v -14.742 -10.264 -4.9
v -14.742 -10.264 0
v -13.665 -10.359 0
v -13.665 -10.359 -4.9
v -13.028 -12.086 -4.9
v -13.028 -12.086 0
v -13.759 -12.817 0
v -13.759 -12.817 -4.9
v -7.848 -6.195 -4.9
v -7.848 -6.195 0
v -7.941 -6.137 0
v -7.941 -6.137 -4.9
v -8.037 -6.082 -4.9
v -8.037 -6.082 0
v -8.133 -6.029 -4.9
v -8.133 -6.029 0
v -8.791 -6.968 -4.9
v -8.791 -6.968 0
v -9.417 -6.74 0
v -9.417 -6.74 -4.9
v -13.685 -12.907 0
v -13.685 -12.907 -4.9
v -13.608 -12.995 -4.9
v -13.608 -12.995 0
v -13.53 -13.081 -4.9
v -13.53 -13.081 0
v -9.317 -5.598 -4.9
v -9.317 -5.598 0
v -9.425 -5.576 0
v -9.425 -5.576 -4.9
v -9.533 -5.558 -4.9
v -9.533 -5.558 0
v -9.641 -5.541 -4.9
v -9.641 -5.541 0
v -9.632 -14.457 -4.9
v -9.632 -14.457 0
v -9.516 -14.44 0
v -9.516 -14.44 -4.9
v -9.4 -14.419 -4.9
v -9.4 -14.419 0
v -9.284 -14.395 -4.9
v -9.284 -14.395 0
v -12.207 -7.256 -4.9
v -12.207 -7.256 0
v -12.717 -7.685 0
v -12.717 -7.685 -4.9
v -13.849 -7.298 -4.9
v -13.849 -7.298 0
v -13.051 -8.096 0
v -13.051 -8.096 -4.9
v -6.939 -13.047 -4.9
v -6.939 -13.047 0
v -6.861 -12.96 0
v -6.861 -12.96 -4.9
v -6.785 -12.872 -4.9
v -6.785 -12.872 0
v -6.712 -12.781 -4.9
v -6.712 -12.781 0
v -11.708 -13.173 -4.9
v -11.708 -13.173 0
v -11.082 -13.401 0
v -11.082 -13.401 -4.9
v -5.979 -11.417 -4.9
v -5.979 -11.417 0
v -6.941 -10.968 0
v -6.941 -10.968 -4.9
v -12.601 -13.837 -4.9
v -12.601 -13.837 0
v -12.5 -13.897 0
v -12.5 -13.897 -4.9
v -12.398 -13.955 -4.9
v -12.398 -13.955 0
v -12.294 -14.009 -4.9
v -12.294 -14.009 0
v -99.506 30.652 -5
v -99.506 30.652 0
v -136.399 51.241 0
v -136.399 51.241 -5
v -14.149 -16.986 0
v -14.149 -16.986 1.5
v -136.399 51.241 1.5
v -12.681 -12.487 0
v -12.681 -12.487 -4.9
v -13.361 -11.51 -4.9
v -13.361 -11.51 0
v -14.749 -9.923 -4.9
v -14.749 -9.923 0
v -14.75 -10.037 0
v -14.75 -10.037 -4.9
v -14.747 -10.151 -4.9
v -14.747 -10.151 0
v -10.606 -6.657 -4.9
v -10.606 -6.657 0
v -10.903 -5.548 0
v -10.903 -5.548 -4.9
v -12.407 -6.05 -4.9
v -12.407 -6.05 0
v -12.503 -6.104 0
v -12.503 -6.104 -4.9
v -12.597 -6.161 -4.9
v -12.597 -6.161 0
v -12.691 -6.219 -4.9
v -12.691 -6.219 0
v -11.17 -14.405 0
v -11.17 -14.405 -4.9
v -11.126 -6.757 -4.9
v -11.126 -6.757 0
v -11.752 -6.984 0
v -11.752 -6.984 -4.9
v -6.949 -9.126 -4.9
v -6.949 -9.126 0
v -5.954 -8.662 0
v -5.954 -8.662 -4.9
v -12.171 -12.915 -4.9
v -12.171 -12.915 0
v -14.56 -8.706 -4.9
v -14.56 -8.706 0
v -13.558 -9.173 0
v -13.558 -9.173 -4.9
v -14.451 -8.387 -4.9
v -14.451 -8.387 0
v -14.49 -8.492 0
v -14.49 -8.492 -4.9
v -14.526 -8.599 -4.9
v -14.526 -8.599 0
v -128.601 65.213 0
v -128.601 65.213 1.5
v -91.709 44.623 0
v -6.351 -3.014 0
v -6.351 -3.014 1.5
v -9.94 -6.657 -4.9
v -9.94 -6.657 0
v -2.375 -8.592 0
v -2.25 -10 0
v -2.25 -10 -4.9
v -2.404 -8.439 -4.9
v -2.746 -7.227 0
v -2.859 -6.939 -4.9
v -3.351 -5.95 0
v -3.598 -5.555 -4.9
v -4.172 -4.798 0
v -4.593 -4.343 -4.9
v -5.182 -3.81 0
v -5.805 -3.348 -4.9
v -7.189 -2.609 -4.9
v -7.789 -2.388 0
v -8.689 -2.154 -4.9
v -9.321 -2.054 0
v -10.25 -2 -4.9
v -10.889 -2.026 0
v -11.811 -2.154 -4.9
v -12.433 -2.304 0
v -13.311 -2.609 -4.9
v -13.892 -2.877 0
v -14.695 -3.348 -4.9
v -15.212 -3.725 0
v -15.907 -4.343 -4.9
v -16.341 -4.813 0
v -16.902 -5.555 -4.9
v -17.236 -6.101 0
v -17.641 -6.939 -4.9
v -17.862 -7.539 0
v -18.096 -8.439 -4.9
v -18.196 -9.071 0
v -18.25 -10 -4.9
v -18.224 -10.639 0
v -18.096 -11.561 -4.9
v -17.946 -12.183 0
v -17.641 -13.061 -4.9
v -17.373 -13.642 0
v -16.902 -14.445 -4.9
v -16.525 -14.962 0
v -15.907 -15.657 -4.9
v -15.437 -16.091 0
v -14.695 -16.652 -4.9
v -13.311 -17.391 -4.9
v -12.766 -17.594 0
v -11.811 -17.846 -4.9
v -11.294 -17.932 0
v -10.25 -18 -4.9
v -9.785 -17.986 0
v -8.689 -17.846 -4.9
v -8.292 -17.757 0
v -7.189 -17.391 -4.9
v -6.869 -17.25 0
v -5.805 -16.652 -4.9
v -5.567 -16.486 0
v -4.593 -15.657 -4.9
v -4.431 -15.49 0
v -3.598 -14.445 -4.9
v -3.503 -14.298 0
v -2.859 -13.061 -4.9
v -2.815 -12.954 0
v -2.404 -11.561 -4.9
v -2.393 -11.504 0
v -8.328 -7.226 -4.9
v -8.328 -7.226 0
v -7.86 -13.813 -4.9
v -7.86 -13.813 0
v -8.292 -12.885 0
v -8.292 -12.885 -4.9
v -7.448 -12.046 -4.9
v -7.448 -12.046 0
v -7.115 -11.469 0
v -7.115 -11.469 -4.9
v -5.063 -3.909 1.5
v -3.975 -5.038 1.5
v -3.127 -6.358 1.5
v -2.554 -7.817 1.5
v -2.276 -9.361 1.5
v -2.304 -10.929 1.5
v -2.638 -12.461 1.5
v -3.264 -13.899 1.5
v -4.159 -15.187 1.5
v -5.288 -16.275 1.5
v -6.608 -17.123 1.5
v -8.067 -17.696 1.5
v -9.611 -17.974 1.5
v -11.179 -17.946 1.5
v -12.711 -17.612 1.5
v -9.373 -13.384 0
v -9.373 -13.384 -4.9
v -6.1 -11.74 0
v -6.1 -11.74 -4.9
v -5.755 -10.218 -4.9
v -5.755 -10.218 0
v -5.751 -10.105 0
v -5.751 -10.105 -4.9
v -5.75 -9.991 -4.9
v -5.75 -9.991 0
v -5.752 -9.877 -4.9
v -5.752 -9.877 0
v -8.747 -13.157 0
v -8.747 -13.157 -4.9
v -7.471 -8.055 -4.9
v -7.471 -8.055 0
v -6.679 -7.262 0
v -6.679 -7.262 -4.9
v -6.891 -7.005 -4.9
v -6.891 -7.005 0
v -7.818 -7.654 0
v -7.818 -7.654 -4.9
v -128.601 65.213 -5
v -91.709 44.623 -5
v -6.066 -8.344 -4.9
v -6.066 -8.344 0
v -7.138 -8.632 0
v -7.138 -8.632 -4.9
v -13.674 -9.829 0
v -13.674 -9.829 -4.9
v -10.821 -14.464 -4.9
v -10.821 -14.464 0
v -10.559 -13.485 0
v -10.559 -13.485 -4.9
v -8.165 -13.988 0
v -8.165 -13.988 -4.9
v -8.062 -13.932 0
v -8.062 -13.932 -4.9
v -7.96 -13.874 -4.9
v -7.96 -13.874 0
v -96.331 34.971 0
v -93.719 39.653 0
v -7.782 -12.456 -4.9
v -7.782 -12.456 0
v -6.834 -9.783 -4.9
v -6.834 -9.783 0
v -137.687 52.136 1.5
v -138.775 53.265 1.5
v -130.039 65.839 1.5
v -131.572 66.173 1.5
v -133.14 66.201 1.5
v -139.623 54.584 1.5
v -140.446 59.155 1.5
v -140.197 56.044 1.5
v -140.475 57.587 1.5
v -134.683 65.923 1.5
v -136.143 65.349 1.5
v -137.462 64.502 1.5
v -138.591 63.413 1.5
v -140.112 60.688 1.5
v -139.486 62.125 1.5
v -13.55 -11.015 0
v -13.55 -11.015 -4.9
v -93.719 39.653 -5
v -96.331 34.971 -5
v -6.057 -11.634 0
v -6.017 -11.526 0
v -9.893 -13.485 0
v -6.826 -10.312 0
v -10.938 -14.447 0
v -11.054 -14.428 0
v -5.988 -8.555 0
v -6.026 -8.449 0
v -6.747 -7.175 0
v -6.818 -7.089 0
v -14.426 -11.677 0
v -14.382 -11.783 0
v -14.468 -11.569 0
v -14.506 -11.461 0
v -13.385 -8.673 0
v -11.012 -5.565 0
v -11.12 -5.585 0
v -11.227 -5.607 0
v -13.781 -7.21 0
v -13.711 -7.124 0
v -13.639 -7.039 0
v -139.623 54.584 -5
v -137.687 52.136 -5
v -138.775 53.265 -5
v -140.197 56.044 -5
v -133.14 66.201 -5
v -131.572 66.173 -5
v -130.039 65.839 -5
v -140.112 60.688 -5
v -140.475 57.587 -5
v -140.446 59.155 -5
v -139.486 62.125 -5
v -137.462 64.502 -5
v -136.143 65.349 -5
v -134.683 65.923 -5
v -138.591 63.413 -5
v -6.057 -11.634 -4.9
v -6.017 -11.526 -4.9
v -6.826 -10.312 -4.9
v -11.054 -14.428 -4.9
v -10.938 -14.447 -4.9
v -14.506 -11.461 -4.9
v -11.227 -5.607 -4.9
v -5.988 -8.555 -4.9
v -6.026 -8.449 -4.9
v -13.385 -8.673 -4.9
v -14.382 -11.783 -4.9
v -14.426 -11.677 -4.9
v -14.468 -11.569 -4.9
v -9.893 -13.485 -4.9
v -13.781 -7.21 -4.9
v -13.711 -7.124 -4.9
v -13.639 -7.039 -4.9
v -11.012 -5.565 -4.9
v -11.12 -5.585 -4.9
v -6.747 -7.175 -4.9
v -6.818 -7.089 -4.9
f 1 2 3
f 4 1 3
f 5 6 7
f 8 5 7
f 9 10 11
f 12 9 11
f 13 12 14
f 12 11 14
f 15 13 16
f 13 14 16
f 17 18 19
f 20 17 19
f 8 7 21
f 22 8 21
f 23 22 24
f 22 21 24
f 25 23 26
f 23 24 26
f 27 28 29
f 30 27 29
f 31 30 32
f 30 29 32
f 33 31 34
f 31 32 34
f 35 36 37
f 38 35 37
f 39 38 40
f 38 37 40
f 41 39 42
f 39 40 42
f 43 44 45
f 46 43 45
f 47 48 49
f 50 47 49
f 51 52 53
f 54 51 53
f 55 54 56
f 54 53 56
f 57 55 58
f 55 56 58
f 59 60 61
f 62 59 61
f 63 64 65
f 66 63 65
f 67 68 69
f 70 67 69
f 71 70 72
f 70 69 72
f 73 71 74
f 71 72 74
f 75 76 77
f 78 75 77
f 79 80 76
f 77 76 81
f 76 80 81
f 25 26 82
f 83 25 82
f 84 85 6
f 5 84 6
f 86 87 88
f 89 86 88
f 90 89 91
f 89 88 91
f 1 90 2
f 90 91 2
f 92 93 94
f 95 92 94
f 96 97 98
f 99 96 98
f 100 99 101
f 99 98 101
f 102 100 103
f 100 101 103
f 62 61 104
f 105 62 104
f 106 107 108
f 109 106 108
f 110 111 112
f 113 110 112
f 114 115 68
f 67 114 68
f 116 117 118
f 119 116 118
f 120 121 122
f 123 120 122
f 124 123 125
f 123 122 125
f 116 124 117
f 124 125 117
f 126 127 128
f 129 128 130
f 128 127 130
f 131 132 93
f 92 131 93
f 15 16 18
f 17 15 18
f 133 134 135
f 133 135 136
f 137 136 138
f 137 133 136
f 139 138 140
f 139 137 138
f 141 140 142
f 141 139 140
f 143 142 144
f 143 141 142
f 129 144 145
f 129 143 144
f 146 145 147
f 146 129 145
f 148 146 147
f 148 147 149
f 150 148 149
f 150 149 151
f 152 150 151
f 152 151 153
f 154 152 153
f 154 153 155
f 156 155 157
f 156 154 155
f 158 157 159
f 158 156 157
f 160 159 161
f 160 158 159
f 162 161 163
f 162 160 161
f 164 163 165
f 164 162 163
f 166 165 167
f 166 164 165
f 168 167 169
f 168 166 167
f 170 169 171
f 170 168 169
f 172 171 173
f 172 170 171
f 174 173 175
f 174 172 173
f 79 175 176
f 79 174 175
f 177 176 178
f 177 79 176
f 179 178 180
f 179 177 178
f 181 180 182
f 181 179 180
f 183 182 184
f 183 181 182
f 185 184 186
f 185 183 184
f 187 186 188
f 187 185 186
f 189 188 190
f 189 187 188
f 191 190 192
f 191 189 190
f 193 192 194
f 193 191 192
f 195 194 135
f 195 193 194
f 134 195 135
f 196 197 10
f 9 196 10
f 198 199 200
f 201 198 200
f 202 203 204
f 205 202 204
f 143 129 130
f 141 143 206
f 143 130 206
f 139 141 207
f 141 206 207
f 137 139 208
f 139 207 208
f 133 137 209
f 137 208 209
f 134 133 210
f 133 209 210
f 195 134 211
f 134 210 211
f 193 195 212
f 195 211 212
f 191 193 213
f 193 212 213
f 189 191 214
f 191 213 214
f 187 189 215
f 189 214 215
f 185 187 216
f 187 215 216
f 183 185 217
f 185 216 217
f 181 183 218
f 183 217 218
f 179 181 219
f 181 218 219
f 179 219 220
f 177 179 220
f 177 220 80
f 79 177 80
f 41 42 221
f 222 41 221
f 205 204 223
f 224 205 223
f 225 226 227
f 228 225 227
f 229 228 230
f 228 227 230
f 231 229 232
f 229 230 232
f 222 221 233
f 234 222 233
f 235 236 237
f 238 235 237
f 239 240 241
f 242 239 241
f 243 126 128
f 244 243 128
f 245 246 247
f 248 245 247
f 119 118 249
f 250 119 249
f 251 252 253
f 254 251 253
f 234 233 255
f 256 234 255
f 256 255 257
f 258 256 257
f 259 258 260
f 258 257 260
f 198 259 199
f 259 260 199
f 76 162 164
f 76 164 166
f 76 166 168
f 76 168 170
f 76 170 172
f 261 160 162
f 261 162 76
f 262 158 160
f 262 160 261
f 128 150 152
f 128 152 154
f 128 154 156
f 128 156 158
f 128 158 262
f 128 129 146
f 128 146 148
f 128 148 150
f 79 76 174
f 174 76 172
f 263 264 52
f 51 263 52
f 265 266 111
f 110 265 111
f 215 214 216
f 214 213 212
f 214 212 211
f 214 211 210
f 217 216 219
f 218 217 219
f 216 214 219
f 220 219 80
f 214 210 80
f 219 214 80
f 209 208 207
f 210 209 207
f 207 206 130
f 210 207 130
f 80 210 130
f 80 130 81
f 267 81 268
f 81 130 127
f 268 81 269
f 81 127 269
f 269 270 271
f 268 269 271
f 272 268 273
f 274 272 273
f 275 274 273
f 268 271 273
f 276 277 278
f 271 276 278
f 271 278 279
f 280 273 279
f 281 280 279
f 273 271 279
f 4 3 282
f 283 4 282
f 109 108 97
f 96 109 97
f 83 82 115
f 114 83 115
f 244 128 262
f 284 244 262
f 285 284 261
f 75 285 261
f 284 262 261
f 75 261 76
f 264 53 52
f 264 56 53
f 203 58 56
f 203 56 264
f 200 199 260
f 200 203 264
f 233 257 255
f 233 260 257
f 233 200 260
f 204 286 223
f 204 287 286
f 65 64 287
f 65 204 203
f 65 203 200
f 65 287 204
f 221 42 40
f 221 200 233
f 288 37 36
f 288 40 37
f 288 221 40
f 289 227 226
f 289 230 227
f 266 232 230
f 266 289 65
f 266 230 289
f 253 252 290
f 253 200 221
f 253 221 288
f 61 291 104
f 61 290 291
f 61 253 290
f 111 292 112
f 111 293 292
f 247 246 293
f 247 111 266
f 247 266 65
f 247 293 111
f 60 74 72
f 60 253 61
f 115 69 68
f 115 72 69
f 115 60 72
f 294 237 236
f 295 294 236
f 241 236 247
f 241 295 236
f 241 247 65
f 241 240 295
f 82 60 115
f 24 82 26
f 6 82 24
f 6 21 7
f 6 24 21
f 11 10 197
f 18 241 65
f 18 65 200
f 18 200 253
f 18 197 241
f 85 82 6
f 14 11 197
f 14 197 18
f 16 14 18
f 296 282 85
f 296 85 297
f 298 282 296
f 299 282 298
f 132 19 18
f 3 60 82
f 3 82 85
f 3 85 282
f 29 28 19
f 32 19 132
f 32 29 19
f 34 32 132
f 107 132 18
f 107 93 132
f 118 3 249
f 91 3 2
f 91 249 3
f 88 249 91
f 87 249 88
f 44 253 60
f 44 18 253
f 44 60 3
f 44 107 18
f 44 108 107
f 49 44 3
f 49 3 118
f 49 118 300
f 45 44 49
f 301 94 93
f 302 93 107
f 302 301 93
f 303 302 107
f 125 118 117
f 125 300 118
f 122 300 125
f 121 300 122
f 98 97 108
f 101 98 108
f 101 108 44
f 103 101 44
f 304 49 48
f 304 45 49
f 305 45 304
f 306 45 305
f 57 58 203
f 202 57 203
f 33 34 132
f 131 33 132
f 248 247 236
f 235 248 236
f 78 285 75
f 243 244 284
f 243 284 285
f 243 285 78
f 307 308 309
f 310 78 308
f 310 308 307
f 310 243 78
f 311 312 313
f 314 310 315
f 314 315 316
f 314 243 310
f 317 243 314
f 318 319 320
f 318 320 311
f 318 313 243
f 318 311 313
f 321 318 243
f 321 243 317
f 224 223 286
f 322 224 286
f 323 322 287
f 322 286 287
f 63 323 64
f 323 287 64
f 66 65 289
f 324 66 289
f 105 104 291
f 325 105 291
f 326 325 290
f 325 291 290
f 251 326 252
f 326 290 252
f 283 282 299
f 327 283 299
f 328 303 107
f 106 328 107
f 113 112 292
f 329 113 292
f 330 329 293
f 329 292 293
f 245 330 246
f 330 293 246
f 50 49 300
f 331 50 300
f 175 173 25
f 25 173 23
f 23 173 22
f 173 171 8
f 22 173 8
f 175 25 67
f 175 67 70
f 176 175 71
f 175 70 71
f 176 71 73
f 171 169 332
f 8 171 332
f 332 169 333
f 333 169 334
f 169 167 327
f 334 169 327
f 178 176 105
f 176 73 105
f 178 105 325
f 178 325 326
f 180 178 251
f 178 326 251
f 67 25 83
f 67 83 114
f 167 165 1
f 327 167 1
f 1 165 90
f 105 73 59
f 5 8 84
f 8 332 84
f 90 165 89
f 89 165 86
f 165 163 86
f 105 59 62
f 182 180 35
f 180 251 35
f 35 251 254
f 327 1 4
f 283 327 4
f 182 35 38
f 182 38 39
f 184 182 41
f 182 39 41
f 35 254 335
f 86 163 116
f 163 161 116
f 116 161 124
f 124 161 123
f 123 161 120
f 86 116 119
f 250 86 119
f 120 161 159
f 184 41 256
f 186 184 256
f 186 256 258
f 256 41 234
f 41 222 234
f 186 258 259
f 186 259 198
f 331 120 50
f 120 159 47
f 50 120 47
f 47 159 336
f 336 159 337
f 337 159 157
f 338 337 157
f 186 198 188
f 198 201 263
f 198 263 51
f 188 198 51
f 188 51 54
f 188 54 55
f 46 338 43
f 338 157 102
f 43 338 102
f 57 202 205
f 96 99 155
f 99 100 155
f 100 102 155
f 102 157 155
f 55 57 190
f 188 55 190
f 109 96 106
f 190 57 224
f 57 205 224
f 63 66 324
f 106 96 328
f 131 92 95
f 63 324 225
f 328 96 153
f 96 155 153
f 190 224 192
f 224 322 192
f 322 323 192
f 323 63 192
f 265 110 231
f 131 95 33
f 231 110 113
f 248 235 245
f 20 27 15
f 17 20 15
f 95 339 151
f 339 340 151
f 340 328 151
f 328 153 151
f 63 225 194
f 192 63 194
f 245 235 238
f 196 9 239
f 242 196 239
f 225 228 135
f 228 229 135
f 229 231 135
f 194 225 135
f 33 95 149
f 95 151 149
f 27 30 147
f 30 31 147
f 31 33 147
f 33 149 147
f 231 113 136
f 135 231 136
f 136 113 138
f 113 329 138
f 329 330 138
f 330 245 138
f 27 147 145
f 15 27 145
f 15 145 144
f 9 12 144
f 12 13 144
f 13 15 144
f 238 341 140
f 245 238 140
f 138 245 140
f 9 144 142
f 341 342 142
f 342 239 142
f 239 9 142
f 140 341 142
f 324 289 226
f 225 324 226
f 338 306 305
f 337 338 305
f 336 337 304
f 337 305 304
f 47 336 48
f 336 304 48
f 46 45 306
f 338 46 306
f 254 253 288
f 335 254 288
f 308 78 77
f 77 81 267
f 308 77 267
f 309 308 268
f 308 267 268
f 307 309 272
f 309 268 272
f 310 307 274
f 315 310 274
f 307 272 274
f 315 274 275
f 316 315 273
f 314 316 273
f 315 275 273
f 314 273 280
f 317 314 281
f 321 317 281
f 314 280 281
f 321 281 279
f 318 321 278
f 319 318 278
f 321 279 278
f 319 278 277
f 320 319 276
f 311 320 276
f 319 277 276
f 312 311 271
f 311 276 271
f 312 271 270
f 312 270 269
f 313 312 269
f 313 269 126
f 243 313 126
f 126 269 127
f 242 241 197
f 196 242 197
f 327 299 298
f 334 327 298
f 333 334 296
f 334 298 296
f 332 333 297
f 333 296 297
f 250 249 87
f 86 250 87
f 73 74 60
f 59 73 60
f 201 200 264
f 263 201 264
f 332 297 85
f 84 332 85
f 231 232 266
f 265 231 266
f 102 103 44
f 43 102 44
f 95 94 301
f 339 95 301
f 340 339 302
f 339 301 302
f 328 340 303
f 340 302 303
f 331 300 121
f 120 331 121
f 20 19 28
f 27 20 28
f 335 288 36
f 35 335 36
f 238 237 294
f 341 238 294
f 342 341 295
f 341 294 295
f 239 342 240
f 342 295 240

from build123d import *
from build123d.topology import SkipClean

# Parameters (mm, degrees)
ESQUISSE1_R        = 8
BOSS_EXTRU_1_DEPTH = 4.9
BOSS_EXTRU_2_START = 1.5
BOSS_EXTRU_2_DEPTH = 1.5
BOSS_EXTRU_3_DEPTH = 5


with BuildPart() as part:
    # Esquisse1 → Boss.-Extru.1 (new body)
    with BuildSketch(Plane.XY):
        with Locations((-10.25, -10)):
            Circle(ESQUISSE1_R)
        with BuildLine():
            Line((-5.751675839, -9.877200395), (-6.833750507, -9.782531128))
            Line((-6.833750507, -9.782531128), (-6.949445107, -9.126394451))
            Line((-6.949445107, -9.126394451), (-5.953521963, -8.661987862))
            ThreePointArc((-5.953521963, -8.661987862), (-6.006634107, -8.502052772), (-6.065697468, -8.344218516))
            Line((-6.065697468, -8.344218516), (-7.138261768, -8.631611254))
            Line((-7.138261768, -8.631611254), (-7.47139109, -8.054614344))
            Line((-7.47139109, -8.054614344), (-6.678798898, -7.262022153))
            ThreePointArc((-6.678798898, -7.262022153), (-6.782621037, -7.131675902), (-6.891198054, -7.005263035))
            Line((-6.891198054, -7.005263035), (-7.818046533, -7.654249327))
            Line((-7.818046533, -7.654249327), (-8.328430264, -7.225986526))
            Line((-8.328430264, -7.225986526), (-7.847635402, -6.194918616))
            ThreePointArc((-7.847635402, -6.194918616), (-7.988951343, -6.109285545), (-8.133315872, -6.028898352))
            Line((-8.133315872, -6.028898352), (-8.791112727, -6.968329619))
            Line((-8.791112727, -6.968329619), (-9.417191057, -6.740455742))
            Line((-9.417191057, -6.740455742), (-9.317216173, -5.597737589))
            ThreePointArc((-9.317216173, -5.597737589), (-9.478728542, -5.566588183), (-9.641271425, -5.541362369))
            Line((-9.641271425, -5.541362369), (-9.940094206, -6.656584169))
            Line((-9.940094206, -6.656584169), (-10.606352849, -6.656584169))
            Line((-10.606352849, -6.656584169), (-10.903477232, -5.547700874))
            ThreePointArc((-10.903477232, -5.547700874), (-11.065761738, -5.574558464), (-11.226956242, -5.607329229))
            Line((-11.226956242, -5.607329229), (-11.126406846, -6.756614081))
            Line((-11.126406846, -6.756614081), (-11.752485176, -6.984487958))
            Line((-11.752485176, -6.984487958), (-12.406540122, -6.050400691))
            ThreePointArc((-12.406540122, -6.050400691), (-12.550096477, -6.132241451), (-12.690551241, -6.219297732))
            Line((-12.690551241, -6.219297732), (-12.206963835, -7.256354271))
            Line((-12.206963835, -7.256354271), (-12.717347566, -7.684617071))
            Line((-12.717347566, -7.684617071), (-13.638885709, -7.039349117))
            ThreePointArc((-13.638885709, -7.039349117), (-13.74618945, -7.166864047), (-13.848697947, -7.298264801))
            Line((-13.848697947, -7.298264801), (-13.051434053, -8.095528695))
            Line((-13.051434053, -8.095528695), (-13.384563375, -8.672525605))
            Line((-13.384563375, -8.672525605), (-14.450903238, -8.3868007))
            ThreePointArc((-14.450903238, -8.3868007), (-14.508366703, -8.545244687), (-14.559856563, -8.705729393))
            Line((-14.559856563, -8.705729393), (-13.557961929, -9.172920534))
            Line((-13.557961929, -9.172920534), (-13.673656528, -9.829057211))
            Line((-13.673656528, -9.829057211), (-14.74934404, -9.923167674))
            ThreePointArc((-14.74934404, -9.923167674), (-14.749021481, -10.093838761), (-14.74222728, -10.264374865))
            Line((-14.74222728, -10.264374865), (-13.665452724, -10.358580432))
            Line((-13.665452724, -10.358580432), (-13.549758125, -11.014717109))
            Line((-13.549758125, -11.014717109), (-14.506309194, -11.460764198))
            ThreePointArc((-14.506309194, -11.460764198), (-14.447094307, -11.623083293), (-14.381691786, -11.78300953))
            Line((-14.381691786, -11.78300953), (-13.360941463, -11.509500306))
            Line((-13.360941463, -11.509500306), (-13.027812142, -12.086497216))
            Line((-13.027812142, -12.086497216), (-13.758807936, -12.817493011))
            ThreePointArc((-13.758807936, -12.817493011), (-13.646852578, -12.951506829), (-13.529782028, -13.081076086))
            Line((-13.529782028, -13.081076086), (-12.681156698, -12.486862233))
            Line((-12.681156698, -12.486862233), (-12.170772967, -12.915125033))
            Line((-12.170772967, -12.915125033), (-12.600738895, -13.837189942))
            ThreePointArc((-12.600738895, -13.837189942), (-12.448909121, -13.926168447), (-12.293716433, -14.009142444))
            Line((-12.293716433, -14.009142444), (-11.708090504, -13.172781941))
            Line((-11.708090504, -13.172781941), (-11.082012174, -13.400655818))
            Line((-11.082012174, -13.400655818), (-11.169878896, -14.404977051))
            ThreePointArc((-11.169878896, -14.404977051), (-10.996236031, -14.437694422), (-10.821442589, -14.463569577))
            Line((-10.821442589, -14.463569577), (-10.559109026, -13.48452739))
            Line((-10.559109026, -13.48452739), (-9.892850383, -13.48452739))
            Line((-9.892850383, -13.48452739), (-9.632173683, -14.457386077))
            ThreePointArc((-9.632173683, -14.457386077), (-9.45766281, -14.42969545), (-9.284373537, -14.395175256))
            Line((-9.284373537, -14.395175256), (-9.372796385, -13.384497479))
            Line((-9.372796385, -13.384497479), (-8.746718055, -13.156623602))
            Line((-8.746718055, -13.156623602), (-8.164782025, -13.987714383))
            ThreePointArc((-8.164782025, -13.987714383), (-8.010469052, -13.903139907), (-7.859580663, -13.812596936))
            Line((-7.859580663, -13.812596936), (-8.292239396, -12.884757289))
            Line((-8.292239396, -12.884757289), (-7.781855665, -12.456494489))
            Line((-7.781855665, -12.456494489), (-6.938532496, -13.046995729))
            ThreePointArc((-6.938532496, -13.046995729), (-6.822819391, -12.916236114), (-6.712266113, -12.78108593))
            Line((-6.712266113, -12.78108593), (-7.447769178, -12.045582865))
            Line((-7.447769178, -12.045582865), (-7.114639857, -11.468585954))
            Line((-7.114639857, -11.468585954), (-6.100183444, -11.740408731))
            ThreePointArc((-6.100183444, -11.740408731), (-6.036436962, -11.579837499), (-5.978900904, -11.416937723))
            Line((-5.978900904, -11.416937723), (-6.941241303, -10.968191026))
            Line((-6.941241303, -10.968191026), (-6.825546704, -10.312054348))
            Line((-6.825546704, -10.312054348), (-5.755303948, -10.21842024))
            ThreePointArc((-5.755303948, -10.21842024), (-5.750254354, -10.04784472), (-5.751675839, -9.877200395))
        make_face(mode=Mode.SUBTRACT)
    extrude(amount=-BOSS_EXTRU_1_DEPTH)

    # Esquisse2 → Boss.-Extru.2 (add)
    with SkipClean():  # the faces are left unmerged after this step: merging them gives an invalid solid
        with BuildSketch(Plane.XY.offset(BOSS_EXTRU_2_START)):
            with BuildLine():
                Line((-14.148674299, -16.985723922), (-136.398842928, 51.241076313))
                ThreePointArc((-136.398842928, 51.241076313), (-139.48589255, 62.125474534), (-128.601494329, 65.212524157))
                Line((-128.601494329, 65.212524157), (-6.351325701, -3.014276078))
                ThreePointArc((-6.351325701, -3.014276078), (-3.264276078, -13.898674299), (-14.148674299, -16.985723922))
            make_face()
        extrude(amount=-BOSS_EXTRU_2_DEPTH)
    add(part.part.scale(1), mode=Mode.REPLACE)  # the faces are merged on a copy

    # Esquisse3 → Boss.-Extru.3 (add)
    with BuildSketch(Plane(origin=(0, 0, 0), x_dir=(-1, 0, 0), z_dir=(0, 0, -1))):
        with BuildLine():
            ThreePointArc((136.398842928, 51.241076313), (139.48589255, 62.125474534), (128.601494329, 65.212524157))
            Line((128.601494329, 65.212524157), (91.708785743, 44.623010972))
            ThreePointArc((91.708785743, 44.623010972), (94.95190255, 37.271425877), (99.506134342, 30.651563128))
            Line((99.506134342, 30.651563128), (136.398842928, 51.241076313))
        make_face()
    extrude(amount=BOSS_EXTRU_3_DEPTH)


solid = part.part
